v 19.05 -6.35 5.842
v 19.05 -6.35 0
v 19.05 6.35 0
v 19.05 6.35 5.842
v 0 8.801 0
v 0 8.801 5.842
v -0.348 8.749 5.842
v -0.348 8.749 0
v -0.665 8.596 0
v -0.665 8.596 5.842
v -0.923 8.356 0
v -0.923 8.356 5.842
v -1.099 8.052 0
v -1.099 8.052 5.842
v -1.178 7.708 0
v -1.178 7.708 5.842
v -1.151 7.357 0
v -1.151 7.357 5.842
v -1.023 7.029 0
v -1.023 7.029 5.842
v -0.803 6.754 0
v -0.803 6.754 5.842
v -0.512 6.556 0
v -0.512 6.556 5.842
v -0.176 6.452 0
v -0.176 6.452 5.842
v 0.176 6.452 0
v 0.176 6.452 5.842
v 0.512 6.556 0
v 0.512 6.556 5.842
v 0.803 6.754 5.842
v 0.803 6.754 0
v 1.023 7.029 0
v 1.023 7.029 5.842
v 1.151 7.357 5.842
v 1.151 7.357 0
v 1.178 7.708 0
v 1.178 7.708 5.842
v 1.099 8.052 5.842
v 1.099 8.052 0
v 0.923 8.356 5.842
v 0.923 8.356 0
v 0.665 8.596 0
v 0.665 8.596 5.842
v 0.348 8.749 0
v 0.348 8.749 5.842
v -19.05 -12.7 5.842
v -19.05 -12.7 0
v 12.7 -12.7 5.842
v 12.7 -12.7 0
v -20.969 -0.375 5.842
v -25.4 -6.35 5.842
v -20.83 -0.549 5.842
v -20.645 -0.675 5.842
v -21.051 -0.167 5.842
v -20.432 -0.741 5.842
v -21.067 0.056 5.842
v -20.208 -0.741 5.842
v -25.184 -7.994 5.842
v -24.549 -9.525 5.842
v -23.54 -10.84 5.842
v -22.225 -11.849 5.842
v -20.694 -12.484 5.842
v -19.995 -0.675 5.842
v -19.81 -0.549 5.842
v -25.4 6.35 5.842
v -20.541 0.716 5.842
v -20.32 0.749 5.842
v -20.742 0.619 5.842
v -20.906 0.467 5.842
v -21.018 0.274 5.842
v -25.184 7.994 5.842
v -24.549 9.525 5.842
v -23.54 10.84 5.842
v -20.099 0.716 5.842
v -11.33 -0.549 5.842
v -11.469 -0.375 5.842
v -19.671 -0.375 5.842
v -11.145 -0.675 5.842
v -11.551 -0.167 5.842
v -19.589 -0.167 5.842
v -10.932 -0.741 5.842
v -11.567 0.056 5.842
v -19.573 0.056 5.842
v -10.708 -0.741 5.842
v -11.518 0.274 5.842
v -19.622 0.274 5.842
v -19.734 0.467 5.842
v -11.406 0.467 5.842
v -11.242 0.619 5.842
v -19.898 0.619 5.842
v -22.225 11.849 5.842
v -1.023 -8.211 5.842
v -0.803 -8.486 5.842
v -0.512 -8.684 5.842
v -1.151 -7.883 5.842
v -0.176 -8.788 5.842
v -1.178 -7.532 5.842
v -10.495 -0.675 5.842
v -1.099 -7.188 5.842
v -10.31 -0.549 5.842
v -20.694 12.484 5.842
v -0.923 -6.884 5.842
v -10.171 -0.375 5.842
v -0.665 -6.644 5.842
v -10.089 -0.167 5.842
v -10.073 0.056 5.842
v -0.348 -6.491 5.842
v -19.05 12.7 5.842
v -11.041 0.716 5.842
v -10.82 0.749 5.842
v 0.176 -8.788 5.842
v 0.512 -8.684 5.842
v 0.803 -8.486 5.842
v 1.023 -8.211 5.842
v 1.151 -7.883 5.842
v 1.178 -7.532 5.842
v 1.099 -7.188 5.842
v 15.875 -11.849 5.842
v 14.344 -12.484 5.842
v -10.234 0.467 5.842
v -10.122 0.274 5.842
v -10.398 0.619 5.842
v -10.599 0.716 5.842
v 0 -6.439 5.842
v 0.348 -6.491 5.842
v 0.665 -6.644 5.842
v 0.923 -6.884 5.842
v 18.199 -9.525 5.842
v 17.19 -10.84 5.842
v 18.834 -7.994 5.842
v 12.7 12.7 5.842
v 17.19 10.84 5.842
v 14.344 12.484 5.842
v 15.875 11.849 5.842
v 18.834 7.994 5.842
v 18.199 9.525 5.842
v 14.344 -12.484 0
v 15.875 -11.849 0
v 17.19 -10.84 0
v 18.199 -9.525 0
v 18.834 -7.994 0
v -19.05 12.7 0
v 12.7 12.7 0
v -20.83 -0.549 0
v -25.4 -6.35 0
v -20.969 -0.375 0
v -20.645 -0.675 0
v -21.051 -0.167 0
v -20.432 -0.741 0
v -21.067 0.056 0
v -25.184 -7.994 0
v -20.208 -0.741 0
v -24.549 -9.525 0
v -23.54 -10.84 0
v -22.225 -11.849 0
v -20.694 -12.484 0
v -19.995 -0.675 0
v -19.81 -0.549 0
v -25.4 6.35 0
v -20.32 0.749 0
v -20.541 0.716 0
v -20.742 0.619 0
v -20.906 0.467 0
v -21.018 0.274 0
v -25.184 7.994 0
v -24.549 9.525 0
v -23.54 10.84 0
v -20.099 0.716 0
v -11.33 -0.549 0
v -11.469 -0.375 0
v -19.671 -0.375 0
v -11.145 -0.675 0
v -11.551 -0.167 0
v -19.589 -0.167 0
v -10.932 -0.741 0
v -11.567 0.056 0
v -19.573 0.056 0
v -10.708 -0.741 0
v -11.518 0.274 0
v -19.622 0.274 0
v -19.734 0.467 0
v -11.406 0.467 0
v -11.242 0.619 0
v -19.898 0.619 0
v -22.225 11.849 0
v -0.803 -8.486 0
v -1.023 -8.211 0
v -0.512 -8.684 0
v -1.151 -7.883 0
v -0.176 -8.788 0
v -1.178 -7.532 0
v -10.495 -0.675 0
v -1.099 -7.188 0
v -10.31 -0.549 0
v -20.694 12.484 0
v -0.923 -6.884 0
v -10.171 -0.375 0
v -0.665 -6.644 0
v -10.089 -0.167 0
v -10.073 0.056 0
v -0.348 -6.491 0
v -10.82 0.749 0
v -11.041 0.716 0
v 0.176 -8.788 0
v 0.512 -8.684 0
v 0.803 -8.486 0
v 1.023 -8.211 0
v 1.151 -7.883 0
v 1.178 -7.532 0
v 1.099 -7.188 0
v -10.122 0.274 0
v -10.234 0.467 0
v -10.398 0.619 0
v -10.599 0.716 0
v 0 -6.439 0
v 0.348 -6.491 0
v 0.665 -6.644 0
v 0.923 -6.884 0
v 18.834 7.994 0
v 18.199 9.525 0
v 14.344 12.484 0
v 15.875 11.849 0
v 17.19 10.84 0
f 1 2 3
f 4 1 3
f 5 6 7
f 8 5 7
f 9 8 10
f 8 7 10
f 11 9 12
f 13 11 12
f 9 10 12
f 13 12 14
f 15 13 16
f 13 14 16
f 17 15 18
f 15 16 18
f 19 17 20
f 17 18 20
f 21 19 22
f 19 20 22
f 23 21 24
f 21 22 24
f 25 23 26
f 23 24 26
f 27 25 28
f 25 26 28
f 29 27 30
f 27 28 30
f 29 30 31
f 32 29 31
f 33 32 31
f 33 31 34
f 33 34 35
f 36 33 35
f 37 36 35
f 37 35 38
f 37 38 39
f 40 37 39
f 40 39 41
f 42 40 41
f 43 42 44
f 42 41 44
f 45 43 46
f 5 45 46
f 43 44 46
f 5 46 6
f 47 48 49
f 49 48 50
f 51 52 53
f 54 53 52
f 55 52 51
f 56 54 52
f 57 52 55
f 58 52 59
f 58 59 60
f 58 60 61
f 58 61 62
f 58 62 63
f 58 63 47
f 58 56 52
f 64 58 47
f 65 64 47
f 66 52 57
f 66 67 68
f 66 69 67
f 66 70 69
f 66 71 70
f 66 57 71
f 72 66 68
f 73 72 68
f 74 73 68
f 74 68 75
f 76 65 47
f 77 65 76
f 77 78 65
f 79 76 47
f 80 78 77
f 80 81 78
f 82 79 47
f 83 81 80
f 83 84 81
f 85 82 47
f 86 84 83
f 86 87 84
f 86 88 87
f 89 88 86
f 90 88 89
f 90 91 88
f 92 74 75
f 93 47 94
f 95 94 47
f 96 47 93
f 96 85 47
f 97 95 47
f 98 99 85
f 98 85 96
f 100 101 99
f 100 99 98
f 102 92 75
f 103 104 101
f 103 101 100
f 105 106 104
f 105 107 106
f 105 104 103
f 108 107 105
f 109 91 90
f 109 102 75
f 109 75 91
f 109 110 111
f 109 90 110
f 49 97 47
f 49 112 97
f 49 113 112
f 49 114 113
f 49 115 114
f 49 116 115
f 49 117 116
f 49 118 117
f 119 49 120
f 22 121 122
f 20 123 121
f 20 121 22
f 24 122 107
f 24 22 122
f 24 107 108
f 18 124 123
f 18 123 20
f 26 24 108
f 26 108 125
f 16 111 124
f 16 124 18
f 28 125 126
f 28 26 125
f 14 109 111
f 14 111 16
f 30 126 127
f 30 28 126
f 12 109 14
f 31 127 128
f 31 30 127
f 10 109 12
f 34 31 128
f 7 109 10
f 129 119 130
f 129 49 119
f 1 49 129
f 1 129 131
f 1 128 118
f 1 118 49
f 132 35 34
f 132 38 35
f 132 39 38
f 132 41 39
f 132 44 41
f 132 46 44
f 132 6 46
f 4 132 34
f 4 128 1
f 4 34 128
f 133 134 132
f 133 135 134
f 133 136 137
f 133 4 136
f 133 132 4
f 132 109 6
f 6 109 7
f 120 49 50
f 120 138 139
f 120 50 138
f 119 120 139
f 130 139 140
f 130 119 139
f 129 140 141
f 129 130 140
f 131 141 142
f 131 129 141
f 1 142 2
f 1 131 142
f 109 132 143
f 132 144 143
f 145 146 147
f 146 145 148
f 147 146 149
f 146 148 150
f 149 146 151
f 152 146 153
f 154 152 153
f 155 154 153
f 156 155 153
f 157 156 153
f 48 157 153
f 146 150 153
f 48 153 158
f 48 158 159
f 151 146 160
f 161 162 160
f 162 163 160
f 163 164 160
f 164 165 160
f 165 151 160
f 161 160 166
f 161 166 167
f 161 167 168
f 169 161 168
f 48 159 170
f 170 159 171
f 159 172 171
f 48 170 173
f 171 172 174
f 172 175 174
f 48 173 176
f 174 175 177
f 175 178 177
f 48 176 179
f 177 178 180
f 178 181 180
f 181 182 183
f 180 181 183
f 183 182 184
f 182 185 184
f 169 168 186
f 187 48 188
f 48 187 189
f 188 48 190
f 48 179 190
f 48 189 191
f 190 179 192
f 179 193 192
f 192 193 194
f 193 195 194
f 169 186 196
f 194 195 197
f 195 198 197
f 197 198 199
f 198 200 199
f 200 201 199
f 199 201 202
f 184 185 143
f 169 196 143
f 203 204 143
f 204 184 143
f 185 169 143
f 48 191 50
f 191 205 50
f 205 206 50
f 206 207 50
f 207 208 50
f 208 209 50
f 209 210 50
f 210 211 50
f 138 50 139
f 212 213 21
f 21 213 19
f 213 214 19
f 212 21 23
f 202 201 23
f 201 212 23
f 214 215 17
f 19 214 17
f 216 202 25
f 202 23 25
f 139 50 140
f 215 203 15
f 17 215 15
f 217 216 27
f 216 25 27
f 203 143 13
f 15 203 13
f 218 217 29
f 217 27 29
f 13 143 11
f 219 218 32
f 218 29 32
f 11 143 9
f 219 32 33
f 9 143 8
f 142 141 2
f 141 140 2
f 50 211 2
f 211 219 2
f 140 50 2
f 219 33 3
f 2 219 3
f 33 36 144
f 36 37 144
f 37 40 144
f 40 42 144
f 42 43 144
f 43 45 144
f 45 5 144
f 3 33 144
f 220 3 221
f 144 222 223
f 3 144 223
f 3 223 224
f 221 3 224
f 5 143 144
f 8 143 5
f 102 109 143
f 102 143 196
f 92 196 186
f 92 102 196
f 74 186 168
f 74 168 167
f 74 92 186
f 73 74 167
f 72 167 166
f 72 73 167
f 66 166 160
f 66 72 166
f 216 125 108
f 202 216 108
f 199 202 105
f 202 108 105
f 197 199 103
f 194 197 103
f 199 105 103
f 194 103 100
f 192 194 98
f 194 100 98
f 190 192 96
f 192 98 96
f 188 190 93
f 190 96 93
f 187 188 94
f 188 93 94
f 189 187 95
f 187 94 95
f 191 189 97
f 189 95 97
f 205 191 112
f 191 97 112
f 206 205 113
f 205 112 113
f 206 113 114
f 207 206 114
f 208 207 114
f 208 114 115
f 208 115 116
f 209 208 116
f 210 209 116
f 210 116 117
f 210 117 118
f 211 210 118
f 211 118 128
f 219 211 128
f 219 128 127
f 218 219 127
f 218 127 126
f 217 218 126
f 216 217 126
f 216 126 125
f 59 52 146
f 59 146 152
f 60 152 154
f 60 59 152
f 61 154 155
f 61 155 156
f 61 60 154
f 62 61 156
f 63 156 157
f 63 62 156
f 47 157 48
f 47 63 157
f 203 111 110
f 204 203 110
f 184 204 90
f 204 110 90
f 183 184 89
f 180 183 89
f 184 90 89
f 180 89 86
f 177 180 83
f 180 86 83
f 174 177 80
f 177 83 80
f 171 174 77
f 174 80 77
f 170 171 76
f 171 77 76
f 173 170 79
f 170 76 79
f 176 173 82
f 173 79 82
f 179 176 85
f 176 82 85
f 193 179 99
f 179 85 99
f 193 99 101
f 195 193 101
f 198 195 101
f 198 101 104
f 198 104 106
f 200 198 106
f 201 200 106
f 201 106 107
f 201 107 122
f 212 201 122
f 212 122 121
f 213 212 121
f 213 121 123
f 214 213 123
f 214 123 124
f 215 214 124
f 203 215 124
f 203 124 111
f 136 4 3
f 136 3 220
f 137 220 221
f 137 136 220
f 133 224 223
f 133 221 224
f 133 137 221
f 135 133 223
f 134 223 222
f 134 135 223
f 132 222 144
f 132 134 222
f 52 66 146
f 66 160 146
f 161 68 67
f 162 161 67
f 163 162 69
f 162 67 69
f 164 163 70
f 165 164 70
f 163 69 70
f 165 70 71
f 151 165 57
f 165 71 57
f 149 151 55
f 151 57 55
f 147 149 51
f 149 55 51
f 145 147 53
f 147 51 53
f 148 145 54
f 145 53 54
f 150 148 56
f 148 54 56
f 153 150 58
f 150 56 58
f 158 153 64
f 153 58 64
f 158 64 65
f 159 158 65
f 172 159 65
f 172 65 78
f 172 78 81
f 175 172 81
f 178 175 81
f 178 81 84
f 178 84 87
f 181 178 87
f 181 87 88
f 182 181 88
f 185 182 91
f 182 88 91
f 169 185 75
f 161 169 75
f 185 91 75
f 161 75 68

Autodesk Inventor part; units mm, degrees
ref_plane "YZ Plane" through (0, 0, 0) normal (1, 0, 0) x (0, 1, 0)
ref_plane "XZ Plane" through (0, 0, 0) normal (0, 1, 0) x (-1, 0, 0)
ref_plane "XY Plane" through (0, 0, 0) normal (0, 0, 1) x (1, 0, 0)
sketch "Sketch1" plane through (0, 0, 0) normal (0, 0, 1) x (1, 0, 0)
  line L0 (0, 17.78) -> (0, -17.78) projected
  line L1 (-34.29, 0) -> (27.94, 0) projected
  line L2 (-25.4, -12.7) -> (19.05, -12.7)
  line L3 (19.05, -12.7) -> (19.05, 12.7)
  line L4 (19.05, 12.7) -> (-25.4, 12.7)
  line L5 (-25.4, 12.7) -> (-25.4, -12.7)
  line L6 (-25.4, -12.7) -> (19.05, 12.7) construction
  line L7 (19.05, -12.7) -> (-25.4, 12.7) construction
  line L8 (-20.32, 0) -> (-10.82, 0) construction
  point P0 (0, 0)
  point P1 (-3.175, 0)
  point P2 (-15.57, 0)
  point P3 (0, 7.62)
  point P4 (0, -7.62)
  dimension "d0" = 44.45
  dimension "d1" = 25.4
  dimension "d3" = 19.05
  dimension "d4" = 9.5
  dimension "d5" = 0
  dimension "d6" = 7.62
  dimension "d7" = 7.62
  dimension "d25" = 5.08
extrude "Extrusion1" add sketch "Sketch1" along normal blind 5.842
hole "Hole1" at (-20.32, 0, 0) at (-10.82, 0, 0) direction (0, 0, 1) diameter 1.4986 end through all
hole "Hole2" at (0, 7.62, 0) at (0, -7.62, 0) direction (0, 0, 1) diameter 2.3622 end through all
fillet "Fillet1" radius 6.35 4 edges at (19.05, 12.7, 2.921) (-25.4, 12.7, 2.921) (-25.4, -12.7, 2.921) (19.05, -12.7, 2.921)
